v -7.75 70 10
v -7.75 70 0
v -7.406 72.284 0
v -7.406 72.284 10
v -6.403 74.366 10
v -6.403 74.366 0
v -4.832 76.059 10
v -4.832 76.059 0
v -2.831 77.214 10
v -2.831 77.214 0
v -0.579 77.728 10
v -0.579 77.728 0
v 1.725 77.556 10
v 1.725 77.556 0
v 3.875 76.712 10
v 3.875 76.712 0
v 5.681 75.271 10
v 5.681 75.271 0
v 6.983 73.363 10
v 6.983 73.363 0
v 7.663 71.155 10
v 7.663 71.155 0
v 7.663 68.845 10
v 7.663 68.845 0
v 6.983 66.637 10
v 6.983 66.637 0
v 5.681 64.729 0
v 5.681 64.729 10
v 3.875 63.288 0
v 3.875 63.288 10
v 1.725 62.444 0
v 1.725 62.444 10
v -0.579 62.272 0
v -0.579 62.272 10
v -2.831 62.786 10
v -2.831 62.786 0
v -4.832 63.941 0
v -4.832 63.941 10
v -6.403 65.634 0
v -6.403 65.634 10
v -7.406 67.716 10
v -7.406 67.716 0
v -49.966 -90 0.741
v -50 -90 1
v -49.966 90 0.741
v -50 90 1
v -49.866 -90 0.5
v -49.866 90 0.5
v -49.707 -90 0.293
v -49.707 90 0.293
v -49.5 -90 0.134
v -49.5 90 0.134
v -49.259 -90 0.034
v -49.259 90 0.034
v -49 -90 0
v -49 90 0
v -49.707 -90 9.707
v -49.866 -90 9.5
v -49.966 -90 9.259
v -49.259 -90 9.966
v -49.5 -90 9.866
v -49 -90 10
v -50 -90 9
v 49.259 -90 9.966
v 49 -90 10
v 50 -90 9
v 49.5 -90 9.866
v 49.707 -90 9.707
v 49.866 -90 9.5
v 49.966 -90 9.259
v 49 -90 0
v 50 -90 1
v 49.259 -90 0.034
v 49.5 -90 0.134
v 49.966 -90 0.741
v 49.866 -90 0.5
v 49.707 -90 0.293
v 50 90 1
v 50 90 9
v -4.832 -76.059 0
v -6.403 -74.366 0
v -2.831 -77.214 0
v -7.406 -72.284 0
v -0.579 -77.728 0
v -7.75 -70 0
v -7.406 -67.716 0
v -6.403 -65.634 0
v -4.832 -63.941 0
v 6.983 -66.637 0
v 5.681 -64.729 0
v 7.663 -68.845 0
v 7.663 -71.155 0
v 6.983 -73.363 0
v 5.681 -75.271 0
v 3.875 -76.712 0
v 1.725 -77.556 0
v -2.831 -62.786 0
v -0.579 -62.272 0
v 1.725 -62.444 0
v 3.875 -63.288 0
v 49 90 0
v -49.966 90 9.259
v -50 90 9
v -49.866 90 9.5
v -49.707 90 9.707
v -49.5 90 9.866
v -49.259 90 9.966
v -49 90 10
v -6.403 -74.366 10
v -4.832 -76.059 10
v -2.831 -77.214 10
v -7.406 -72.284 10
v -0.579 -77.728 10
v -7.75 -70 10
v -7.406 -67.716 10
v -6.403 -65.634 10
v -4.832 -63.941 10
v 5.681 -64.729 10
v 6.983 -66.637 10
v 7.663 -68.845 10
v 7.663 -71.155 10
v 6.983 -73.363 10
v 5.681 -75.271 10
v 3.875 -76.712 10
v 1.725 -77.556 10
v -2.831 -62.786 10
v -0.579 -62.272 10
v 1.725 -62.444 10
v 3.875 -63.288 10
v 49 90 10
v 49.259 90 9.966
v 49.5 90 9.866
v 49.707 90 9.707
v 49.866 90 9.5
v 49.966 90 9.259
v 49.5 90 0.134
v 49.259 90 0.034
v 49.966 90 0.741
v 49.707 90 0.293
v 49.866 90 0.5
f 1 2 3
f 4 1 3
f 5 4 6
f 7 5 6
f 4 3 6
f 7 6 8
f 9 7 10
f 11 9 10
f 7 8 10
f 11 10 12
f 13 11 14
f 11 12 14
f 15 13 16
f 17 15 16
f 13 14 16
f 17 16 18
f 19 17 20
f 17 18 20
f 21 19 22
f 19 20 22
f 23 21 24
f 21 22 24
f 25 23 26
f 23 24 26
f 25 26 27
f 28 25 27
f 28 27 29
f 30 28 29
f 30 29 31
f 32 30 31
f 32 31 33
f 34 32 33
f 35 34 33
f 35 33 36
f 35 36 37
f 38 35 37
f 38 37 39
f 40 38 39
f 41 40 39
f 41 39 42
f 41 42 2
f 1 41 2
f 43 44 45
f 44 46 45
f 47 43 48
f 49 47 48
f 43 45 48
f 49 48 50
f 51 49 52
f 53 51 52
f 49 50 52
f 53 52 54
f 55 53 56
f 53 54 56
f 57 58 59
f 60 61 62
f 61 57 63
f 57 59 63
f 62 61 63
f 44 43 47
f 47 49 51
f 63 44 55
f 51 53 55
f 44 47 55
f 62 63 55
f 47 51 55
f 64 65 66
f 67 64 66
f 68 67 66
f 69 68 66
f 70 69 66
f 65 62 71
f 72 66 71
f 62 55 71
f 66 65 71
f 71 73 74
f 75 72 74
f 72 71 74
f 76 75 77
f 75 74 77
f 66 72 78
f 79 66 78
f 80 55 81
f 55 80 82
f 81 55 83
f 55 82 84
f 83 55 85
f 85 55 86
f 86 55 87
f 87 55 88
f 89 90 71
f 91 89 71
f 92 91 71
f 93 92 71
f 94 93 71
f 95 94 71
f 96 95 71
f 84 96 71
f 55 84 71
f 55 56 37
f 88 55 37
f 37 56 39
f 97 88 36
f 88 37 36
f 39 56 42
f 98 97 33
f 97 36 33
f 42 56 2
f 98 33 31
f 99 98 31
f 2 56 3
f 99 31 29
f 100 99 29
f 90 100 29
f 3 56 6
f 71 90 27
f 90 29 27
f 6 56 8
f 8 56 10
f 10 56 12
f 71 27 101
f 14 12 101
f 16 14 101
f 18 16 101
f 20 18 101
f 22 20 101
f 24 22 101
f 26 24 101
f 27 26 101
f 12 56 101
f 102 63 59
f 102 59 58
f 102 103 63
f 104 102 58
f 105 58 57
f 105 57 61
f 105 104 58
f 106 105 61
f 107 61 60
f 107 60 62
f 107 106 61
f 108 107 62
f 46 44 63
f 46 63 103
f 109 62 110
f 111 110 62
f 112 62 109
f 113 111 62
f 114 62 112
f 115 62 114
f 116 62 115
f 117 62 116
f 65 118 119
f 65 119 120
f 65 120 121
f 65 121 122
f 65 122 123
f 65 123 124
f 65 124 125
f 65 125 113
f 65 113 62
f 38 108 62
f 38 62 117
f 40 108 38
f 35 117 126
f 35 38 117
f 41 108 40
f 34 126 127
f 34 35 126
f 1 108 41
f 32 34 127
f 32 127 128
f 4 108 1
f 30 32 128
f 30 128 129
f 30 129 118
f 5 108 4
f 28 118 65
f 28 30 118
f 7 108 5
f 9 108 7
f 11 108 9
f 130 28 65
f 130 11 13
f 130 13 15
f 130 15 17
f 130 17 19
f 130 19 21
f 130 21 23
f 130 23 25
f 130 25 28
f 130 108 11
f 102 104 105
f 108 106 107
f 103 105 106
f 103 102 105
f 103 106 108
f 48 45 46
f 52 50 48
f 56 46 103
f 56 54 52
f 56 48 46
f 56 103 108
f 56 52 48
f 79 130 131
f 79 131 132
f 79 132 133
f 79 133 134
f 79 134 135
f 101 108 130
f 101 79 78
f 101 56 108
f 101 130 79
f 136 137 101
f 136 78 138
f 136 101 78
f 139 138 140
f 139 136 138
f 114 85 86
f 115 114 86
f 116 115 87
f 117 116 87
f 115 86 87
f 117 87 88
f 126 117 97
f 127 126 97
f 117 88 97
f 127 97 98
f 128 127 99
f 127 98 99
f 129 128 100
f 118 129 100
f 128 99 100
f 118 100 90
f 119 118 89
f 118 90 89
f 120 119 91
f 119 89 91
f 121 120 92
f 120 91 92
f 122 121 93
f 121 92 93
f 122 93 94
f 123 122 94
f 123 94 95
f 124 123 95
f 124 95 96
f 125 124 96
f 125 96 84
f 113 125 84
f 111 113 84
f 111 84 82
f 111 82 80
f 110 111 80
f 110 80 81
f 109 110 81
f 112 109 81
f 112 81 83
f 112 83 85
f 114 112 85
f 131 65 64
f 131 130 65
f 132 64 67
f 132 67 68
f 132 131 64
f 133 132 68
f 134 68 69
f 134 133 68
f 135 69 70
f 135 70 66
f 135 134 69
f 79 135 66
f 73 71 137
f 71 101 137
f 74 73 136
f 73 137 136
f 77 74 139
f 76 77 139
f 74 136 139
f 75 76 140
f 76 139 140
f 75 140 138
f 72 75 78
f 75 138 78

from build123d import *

# Parameters (mm, degrees)
ESQUISSE1_W               = 100
ESQUISSE1_H               = 180
BOSS_EXTRU_1_DEPTH        = 10
M14_CLEARANCE_HOLE1_D     = 15.5
M14_CLEARANCE_HOLE1_DEPTH = 10
FILLET1_R                 = 1


with BuildPart() as part:
    # Esquisse1 → Boss.-Extru.1 (new body)
    with BuildSketch(Plane.XY):
        Rectangle(ESQUISSE1_W, ESQUISSE1_H)
    extrude(amount=BOSS_EXTRU_1_DEPTH)

    # M14 Clearance Hole1
    with Locations(Plane.XY.offset(10)):
        with Locations((0, 70), (0, -70), (60, -70), (60, 70)):
            Hole(M14_CLEARANCE_HOLE1_D / 2, depth=M14_CLEARANCE_HOLE1_DEPTH)

    # Fillet1
    fillet1_edges = [part.edges().sort_by_distance(p)[0] for p in [
        (-50, 0, 10),
        (50, 0, 10),
        (-50, 0, 0),
        (50, 0, 0),
    ]]
    fillet(fillet1_edges, radius=FILLET1_R)


solid = part.part
